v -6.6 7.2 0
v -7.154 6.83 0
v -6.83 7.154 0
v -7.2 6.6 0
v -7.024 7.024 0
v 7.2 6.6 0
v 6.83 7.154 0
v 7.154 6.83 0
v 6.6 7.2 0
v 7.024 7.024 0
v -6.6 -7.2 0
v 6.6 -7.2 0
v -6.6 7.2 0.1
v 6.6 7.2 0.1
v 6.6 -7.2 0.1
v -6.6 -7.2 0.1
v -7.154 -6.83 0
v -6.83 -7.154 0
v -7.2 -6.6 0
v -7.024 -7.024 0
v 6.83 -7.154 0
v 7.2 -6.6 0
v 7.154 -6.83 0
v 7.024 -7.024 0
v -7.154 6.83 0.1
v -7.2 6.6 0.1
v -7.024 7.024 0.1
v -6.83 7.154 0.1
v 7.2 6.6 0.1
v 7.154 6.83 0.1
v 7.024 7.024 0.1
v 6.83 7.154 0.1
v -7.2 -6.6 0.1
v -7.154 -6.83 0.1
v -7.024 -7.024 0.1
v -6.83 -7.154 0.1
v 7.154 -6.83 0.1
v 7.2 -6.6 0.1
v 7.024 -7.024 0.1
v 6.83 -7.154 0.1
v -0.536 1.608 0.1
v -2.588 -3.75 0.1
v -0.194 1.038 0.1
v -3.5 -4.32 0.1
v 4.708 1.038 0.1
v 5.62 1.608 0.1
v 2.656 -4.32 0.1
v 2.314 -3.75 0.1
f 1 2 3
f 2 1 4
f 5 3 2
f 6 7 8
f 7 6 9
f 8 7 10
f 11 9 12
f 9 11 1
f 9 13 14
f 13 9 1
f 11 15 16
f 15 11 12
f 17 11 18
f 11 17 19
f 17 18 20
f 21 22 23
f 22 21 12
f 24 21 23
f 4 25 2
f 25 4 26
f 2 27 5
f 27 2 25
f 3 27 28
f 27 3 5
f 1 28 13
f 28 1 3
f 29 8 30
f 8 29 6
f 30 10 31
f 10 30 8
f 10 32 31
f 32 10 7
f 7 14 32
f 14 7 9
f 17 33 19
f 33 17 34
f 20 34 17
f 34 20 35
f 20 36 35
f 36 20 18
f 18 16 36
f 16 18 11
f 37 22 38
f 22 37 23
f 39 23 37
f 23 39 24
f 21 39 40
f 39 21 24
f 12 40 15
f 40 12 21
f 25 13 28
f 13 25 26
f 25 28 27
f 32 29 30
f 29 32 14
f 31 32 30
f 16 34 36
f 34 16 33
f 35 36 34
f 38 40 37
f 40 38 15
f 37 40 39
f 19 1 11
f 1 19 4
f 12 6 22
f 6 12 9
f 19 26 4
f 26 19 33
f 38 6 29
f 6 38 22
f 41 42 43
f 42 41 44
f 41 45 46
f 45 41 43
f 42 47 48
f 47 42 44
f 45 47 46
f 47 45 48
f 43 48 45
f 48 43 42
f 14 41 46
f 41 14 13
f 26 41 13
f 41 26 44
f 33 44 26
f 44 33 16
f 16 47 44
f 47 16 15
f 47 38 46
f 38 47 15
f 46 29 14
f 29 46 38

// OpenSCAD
// file: ../p/box3u12.scad
use <../lib.scad>
function ldraw_lib__box3u12() = [
// 0 Box with 3 Parallel Faces without Any Edges
// 0 Name: box3u12.dat
// 0 Author: J.C. Tchang [tchang]
// 0 !LDRAW_ORG Primitive UPDATE 2014-02
// 0 !LICENSE Licensed under CC BY 4.0 : see CAreadme.txt
// 
// 0 BFC CERTIFY CCW
  [0,"BFC","CERTIFY"],
  [0,"BFC","CCW"],
// 
// 0 !HISTORY 2014-12-23 [PTadmin] Official Update 2014-02
// 
// 
// 4 16 -1 1 1 1 1 1 1 1 -1 -1 1 -1
  [4,16,-1,1,1,1,1,1,1,1,-1,-1,1,-1],
// 4 16 -1 1 1 -1 0 1 1 0 1 1 1 1
  [4,16,-1,1,1,-1,0,1,1,0,1,1,1,1],
// 4 16 1 1 -1 1 0 -1 -1 0 -1 -1 1 -1
  [4,16,1,1,-1,1,0,-1,-1,0,-1,-1,1,-1],
];
module ldraw_lib__box3u12(step=0, col=false, unit=2/5, alt=false, line=0.2, solid=!$preview)
    makepoly(ldraw_lib__box3u12(), step=step, col=col, unit=unit, alt=alt, line=line, solid=solid);
ldraw_lib__box3u12(line=0.2);
// file: ../p/1-4cyli.scad
use <../lib.scad>
function ldraw_lib__1_4cyli() = [
// 0 Cylinder 0.25
// 0 Name: 1-4cyli.dat
// 0 Author: James Jessiman
// 0 !LDRAW_ORG Primitive UPDATE 2012-01
// 0 !LICENSE Licensed under CC BY 4.0 : see CAreadme.txt
// 
// 0 BFC CERTIFY CCW
  [0,"BFC","CERTIFY"],
  [0,"BFC","CCW"],
// 
// 0 !HISTORY 2002-03-23 [sbliss] Added BFC statement.
// 0 !HISTORY 2002-04-25 [PTadmin] Official Update 2002-02
// 0 !HISTORY 2007-06-22 [PTadmin] Header formatted for Contributor Agreement
// 0 !HISTORY 2008-07-01 [PTadmin] Official Update 2008-01
// 0 !HISTORY 2012-02-16 [Philo] Changed to CCW
// 0 !HISTORY 2012-03-30 [PTadmin] Official Update 2012-01
// 
// 
// 4 16 1 1 0 0.9239 1 0.3827 0.9239 0 0.3827 1 0 0
  [4,16,1,1,0,0.9239,1,0.3827,0.9239,0,0.3827,1,0,0],
// 5 24 1 0 0 1 1 0 0.9239 0 0.3827 1 0 -1
  [5,24,1,0,0,1,1,0,0.9239,0,0.3827,1,0,-1],
// 4 16 0.9239 1 0.3827 0.7071 1 0.7071 0.7071 0 0.7071 0.9239 0 0.3827
  [4,16,0.9239,1,0.3827,0.7071,1,0.7071,0.7071,0,0.7071,0.9239,0,0.3827],
// 5 24 0.9239 0 0.3827 0.9239 1 0.3827 0.7071 0 0.7071 1 0 0
  [5,24,0.9239,0,0.3827,0.9239,1,0.3827,0.7071,0,0.7071,1,0,0],
// 4 16 0.7071 1 0.7071 0.3827 1 0.9239 0.3827 0 0.9239 0.7071 0 0.7071
  [4,16,0.7071,1,0.7071,0.3827,1,0.9239,0.3827,0,0.9239,0.7071,0,0.7071],
// 5 24 0.7071 0 0.7071 0.7071 1 0.7071 0.3827 0 0.9239 0.9239 0 0.3827
  [5,24,0.7071,0,0.7071,0.7071,1,0.7071,0.3827,0,0.9239,0.9239,0,0.3827],
// 4 16 0.3827 1 0.9239 0 1 1 0 0 1 0.3827 0 0.9239
  [4,16,0.3827,1,0.9239,0,1,1,0,0,1,0.3827,0,0.9239],
// 5 24 0.3827 0 0.9239 0.3827 1 0.9239 0 0 1 0.7071 0 0.7071
  [5,24,0.3827,0,0.9239,0.3827,1,0.9239,0,0,1,0.7071,0,0.7071],
// 5 24 0 0 1 0 1 1 0.3827 0 0.9239 -1 0 1
  [5,24,0,0,1,0,1,1,0.3827,0,0.9239,-1,0,1],
];
module ldraw_lib__1_4cyli(step=0, col=false, unit=2/5, alt=false, line=0.2, solid=!$preview)
    makepoly(ldraw_lib__1_4cyli(), step=step, col=col, unit=unit, alt=alt, line=line, solid=solid);
ldraw_lib__1_4cyli(line=0.2);
// file: ../p/1-4chrd.scad
use <../lib.scad>
function ldraw_lib__1_4chrd() = [
// 0 Chord 0.25
// 0 Name: 1-4chrd.dat
// 0 Author: Max Martin Richter [MMR1988]
// 0 !LDRAW_ORG Primitive UPDATE 2023-05
// 0 !LICENSE Licensed under CC BY 4.0 : see CAreadme.txt
// 
// 0 BFC CERTIFY CCW
  [0,"BFC","CERTIFY"],
  [0,"BFC","CCW"],
// 
// 0 !HISTORY 2004-04-22 [PTadmin] Official Update 2004-02
// 0 !HISTORY 2007-10-09 [PTadmin] Header formatted for Contributor Agreement
// 0 !HISTORY 2008-07-01 [PTadmin] Official Update 2008-01
// 0 !HISTORY 2012-08-02 [MMR1988] Re-creation with PrimGen2 and Rectifier
// 0 !HISTORY 2012-08-09 [PTadmin] Official Update 2012-02
// 0 !HISTORY 2023-10-27 [OrionP] Change author to MMR1988 from hafhead
// 0 !HISTORY 2023-10-31 [OrionP] Official Update 2023-05
// 
// 4 16 0.9239 0 0.3827 0.3827 0 0.9239 0 0 1 1 0 0
  [4,16,0.9239,0,0.3827,0.3827,0,0.9239,0,0,1,1,0,0],
// 3 16 0.7071 0 0.7071 0.3827 0 0.9239 0.9239 0 0.3827
  [3,16,0.7071,0,0.7071,0.3827,0,0.9239,0.9239,0,0.3827],
];
module ldraw_lib__1_4chrd(step=0, col=false, unit=2/5, alt=false, line=0.2, solid=!$preview)
    makepoly(ldraw_lib__1_4chrd(), step=step, col=col, unit=unit, alt=alt, line=line, solid=solid);
ldraw_lib__1_4chrd(line=0.2);
// main file
use <../lib.scad>
use <../p/1-4chrd.scad>
use <../p/1-4cyli.scad>
use <../p/box3u12.scad>
function ldraw_lib__6142271b() = [
// 0 Sticker  1.8 x  1.8 with White Audi Sport Logo on Red Background
// 0 Name: 6142271b.dat
// 0 Author: Massimo Maso [Sirio]
// 0 !LDRAW_ORG Part UPDATE 2025-02
// 0 !LICENSE Licensed under CC BY 4.0 : see CAreadme.txt
// 
// 0 BFC CERTIFY CCW
  [0,"BFC","CERTIFY"],
  [0,"BFC","CCW"],
// 
// 0 !KEYWORDS Bricklink 75873stk01a, Brickowl 427960, LMS, R8, Rebrickable 24755
// 0 !KEYWORDS Set 75873, Speed Champions, Ultra
// 
// 0 !HISTORY 2025-02-27 [OrionP] Official Update 2025-02
// 
// 
// 0 // Primitives
// 1 16 -16.5 0 16.5 -1.5 0 0 0 -1 0 0 0 1.5 1-4chrd.dat
  [1,16,-16.5,0,16.5,-1.5,0,0,0,-1,0,0,0,1.5, ldraw_lib__1_4chrd()],
// 1 16 16.5 0 16.5 1.5 0 0 0 -1 0 0 0 1.5 1-4chrd.dat
  [1,16,16.5,0,16.5,1.5,0,0,0,-1,0,0,0,1.5, ldraw_lib__1_4chrd()],
// 1 16 0 -.25 0 16.5 0 0 0 .25 0 0 0 18 box3u12.dat
  [1,16,0,-.25,0,16.5,0,0,0,.25,0,0,0,18, ldraw_lib__box3u12()],
// 1 16 -16.5 0 -16.5 -1.5 0 0 0 -1 0 0 0 -1.5 1-4chrd.dat
  [1,16,-16.5,0,-16.5,-1.5,0,0,0,-1,0,0,0,-1.5, ldraw_lib__1_4chrd()],
// 1 16 16.5 0 -16.5 1.5 0 0 0 -1 0 0 0 -1.5 1-4chrd.dat
  [1,16,16.5,0,-16.5,1.5,0,0,0,-1,0,0,0,-1.5, ldraw_lib__1_4chrd()],
// 1 16 -16.5 0 16.5 -1.5 0 0 0 -.25 0 0 0 1.5 1-4cyli.dat
  [1,16,-16.5,0,16.5,-1.5,0,0,0,-.25,0,0,0,1.5, ldraw_lib__1_4cyli()],
// 1 16 16.5 0 16.5 1.5 0 0 0 -.25 0 0 0 1.5 1-4cyli.dat
  [1,16,16.5,0,16.5,1.5,0,0,0,-.25,0,0,0,1.5, ldraw_lib__1_4cyli()],
// 1 16 -16.5 0 -16.5 -1.5 0 0 0 -.25 0 0 0 -1.5 1-4cyli.dat
  [1,16,-16.5,0,-16.5,-1.5,0,0,0,-.25,0,0,0,-1.5, ldraw_lib__1_4cyli()],
// 1 16 16.5 0 -16.5 1.5 0 0 0 -.25 0 0 0 -1.5 1-4cyli.dat
  [1,16,16.5,0,-16.5,1.5,0,0,0,-.25,0,0,0,-1.5, ldraw_lib__1_4cyli()],
// 1 4 -16.5 -.25 16.5 -1.5 0 0 0 1 0 0 0 1.5 1-4chrd.dat
  [1,4,-16.5,-.25,16.5,-1.5,0,0,0,1,0,0,0,1.5, ldraw_lib__1_4chrd()],
// 1 4 16.5 -.25 16.5 1.5 0 0 0 1 0 0 0 1.5 1-4chrd.dat
  [1,4,16.5,-.25,16.5,1.5,0,0,0,1,0,0,0,1.5, ldraw_lib__1_4chrd()],
// 1 4 -16.5 -.25 -16.5 -1.5 0 0 0 1 0 0 0 -1.5 1-4chrd.dat
  [1,4,-16.5,-.25,-16.5,-1.5,0,0,0,1,0,0,0,-1.5, ldraw_lib__1_4chrd()],
// 1 4 16.5 -.25 -16.5 1.5 0 0 0 1 0 0 0 -1.5 1-4chrd.dat
  [1,4,16.5,-.25,-16.5,1.5,0,0,0,1,0,0,0,-1.5, ldraw_lib__1_4chrd()],
// 0 // Bottom faces
// 4 16 -16.5 0 18 -16.5 0 -18 -18 0 -16.5 -18 0 16.5
  [4,16,-16.5,0,18,-16.5,0,-18,-18,0,-16.5,-18,0,16.5],
// 4 16 16.5 0 18 18 0 16.5 18 0 -16.5 16.5 0 -18
  [4,16,16.5,0,18,18,0,16.5,18,0,-16.5,16.5,0,-18],
// 0 // Lateral faces
// 4 16 -18 0 16.5 -18 0 -16.5 -18 -.25 -16.5 -18 -.25 16.5
  [4,16,-18,0,16.5,-18,0,-16.5,-18,-.25,-16.5,-18,-.25,16.5],
// 4 16 18 0 16.5 18 -.25 16.5 18 -.25 -16.5 18 0 -16.5
  [4,16,18,0,16.5,18,-.25,16.5,18,-.25,-16.5,18,0,-16.5],
// 0 // White top faces
// 4 15 -1.34 -.25 4.02 -8.75 -.25 -10.8 -6.47 -.25 -9.375 -.485 -.25 2.595
  [4,15,-1.34,-.25,4.02,-8.75,-.25,-10.8,-6.47,-.25,-9.375,-.485,-.25,2.595],
// 4 15 -1.34 -.25 4.02 -.485 -.25 2.595 11.77 -.25 2.595 14.05 -.25 4.02
  [4,15,-1.34,-.25,4.02,-.485,-.25,2.595,11.77,-.25,2.595,14.05,-.25,4.02],
// 4 15 6.64 -.25 -10.8 5.785 -.25 -9.375 -6.47 -.25 -9.375 -8.75 -.25 -10.8
  [4,15,6.64,-.25,-10.8,5.785,-.25,-9.375,-6.47,-.25,-9.375,-8.75,-.25,-10.8],
// 4 15 6.64 -.25 -10.8 14.05 -.25 4.02 11.77 -.25 2.595 5.785 -.25 -9.375
  [4,15,6.64,-.25,-10.8,14.05,-.25,4.02,11.77,-.25,2.595,5.785,-.25,-9.375],
// 0 // Red top faces
// 4 4 -.485 -.25 2.595 -6.47 -.25 -9.375 5.785 -.25 -9.375 11.77 -.25 2.595
  [4,4,-.485,-.25,2.595,-6.47,-.25,-9.375,5.785,-.25,-9.375,11.77,-.25,2.595],
// 4 4 -16.5 -.25 18 -1.34 -.25 4.02 14.05 -.25 4.02 16.5 -.25 18
  [4,4,-16.5,-.25,18,-1.34,-.25,4.02,14.05,-.25,4.02,16.5,-.25,18],
// 4 4 -16.5 -.25 18 -18 -.25 16.5 -8.75 -.25 -10.8 -1.34 -.25 4.02
  [4,4,-16.5,-.25,18,-18,-.25,16.5,-8.75,-.25,-10.8,-1.34,-.25,4.02],
// 4 4 -18 -.25 16.5 -18 -.25 -16.5 -16.5 -.25 -18 -8.75 -.25 -10.8
  [4,4,-18,-.25,16.5,-18,-.25,-16.5,-16.5,-.25,-18,-8.75,-.25,-10.8],
// 4 4 -16.5 -.25 -18 16.5 -.25 -18 6.64 -.25 -10.8 -8.75 -.25 -10.8
  [4,4,-16.5,-.25,-18,16.5,-.25,-18,6.64,-.25,-10.8,-8.75,-.25,-10.8],
// 4 4 16.5 -.25 -18 18 -.25 -16.5 14.05 -.25 4.02 6.64 -.25 -10.8
  [4,4,16.5,-.25,-18,18,-.25,-16.5,14.05,-.25,4.02,6.64,-.25,-10.8],
// 4 4 18 -.25 -16.5 18 -.25 16.5 16.5 -.25 18 14.05 -.25 4.02
  [4,4,18,-.25,-16.5,18,-.25,16.5,16.5,-.25,18,14.05,-.25,4.02],
];
module ldraw_lib__6142271b(step=0, col=false, unit=2/5, alt=false, line=0.2, solid=!$preview)
    makepoly(ldraw_lib__6142271b(), step=step, col=col, unit=unit, alt=alt, line=line, solid=solid);
ldraw_lib__6142271b(line=0.2);
